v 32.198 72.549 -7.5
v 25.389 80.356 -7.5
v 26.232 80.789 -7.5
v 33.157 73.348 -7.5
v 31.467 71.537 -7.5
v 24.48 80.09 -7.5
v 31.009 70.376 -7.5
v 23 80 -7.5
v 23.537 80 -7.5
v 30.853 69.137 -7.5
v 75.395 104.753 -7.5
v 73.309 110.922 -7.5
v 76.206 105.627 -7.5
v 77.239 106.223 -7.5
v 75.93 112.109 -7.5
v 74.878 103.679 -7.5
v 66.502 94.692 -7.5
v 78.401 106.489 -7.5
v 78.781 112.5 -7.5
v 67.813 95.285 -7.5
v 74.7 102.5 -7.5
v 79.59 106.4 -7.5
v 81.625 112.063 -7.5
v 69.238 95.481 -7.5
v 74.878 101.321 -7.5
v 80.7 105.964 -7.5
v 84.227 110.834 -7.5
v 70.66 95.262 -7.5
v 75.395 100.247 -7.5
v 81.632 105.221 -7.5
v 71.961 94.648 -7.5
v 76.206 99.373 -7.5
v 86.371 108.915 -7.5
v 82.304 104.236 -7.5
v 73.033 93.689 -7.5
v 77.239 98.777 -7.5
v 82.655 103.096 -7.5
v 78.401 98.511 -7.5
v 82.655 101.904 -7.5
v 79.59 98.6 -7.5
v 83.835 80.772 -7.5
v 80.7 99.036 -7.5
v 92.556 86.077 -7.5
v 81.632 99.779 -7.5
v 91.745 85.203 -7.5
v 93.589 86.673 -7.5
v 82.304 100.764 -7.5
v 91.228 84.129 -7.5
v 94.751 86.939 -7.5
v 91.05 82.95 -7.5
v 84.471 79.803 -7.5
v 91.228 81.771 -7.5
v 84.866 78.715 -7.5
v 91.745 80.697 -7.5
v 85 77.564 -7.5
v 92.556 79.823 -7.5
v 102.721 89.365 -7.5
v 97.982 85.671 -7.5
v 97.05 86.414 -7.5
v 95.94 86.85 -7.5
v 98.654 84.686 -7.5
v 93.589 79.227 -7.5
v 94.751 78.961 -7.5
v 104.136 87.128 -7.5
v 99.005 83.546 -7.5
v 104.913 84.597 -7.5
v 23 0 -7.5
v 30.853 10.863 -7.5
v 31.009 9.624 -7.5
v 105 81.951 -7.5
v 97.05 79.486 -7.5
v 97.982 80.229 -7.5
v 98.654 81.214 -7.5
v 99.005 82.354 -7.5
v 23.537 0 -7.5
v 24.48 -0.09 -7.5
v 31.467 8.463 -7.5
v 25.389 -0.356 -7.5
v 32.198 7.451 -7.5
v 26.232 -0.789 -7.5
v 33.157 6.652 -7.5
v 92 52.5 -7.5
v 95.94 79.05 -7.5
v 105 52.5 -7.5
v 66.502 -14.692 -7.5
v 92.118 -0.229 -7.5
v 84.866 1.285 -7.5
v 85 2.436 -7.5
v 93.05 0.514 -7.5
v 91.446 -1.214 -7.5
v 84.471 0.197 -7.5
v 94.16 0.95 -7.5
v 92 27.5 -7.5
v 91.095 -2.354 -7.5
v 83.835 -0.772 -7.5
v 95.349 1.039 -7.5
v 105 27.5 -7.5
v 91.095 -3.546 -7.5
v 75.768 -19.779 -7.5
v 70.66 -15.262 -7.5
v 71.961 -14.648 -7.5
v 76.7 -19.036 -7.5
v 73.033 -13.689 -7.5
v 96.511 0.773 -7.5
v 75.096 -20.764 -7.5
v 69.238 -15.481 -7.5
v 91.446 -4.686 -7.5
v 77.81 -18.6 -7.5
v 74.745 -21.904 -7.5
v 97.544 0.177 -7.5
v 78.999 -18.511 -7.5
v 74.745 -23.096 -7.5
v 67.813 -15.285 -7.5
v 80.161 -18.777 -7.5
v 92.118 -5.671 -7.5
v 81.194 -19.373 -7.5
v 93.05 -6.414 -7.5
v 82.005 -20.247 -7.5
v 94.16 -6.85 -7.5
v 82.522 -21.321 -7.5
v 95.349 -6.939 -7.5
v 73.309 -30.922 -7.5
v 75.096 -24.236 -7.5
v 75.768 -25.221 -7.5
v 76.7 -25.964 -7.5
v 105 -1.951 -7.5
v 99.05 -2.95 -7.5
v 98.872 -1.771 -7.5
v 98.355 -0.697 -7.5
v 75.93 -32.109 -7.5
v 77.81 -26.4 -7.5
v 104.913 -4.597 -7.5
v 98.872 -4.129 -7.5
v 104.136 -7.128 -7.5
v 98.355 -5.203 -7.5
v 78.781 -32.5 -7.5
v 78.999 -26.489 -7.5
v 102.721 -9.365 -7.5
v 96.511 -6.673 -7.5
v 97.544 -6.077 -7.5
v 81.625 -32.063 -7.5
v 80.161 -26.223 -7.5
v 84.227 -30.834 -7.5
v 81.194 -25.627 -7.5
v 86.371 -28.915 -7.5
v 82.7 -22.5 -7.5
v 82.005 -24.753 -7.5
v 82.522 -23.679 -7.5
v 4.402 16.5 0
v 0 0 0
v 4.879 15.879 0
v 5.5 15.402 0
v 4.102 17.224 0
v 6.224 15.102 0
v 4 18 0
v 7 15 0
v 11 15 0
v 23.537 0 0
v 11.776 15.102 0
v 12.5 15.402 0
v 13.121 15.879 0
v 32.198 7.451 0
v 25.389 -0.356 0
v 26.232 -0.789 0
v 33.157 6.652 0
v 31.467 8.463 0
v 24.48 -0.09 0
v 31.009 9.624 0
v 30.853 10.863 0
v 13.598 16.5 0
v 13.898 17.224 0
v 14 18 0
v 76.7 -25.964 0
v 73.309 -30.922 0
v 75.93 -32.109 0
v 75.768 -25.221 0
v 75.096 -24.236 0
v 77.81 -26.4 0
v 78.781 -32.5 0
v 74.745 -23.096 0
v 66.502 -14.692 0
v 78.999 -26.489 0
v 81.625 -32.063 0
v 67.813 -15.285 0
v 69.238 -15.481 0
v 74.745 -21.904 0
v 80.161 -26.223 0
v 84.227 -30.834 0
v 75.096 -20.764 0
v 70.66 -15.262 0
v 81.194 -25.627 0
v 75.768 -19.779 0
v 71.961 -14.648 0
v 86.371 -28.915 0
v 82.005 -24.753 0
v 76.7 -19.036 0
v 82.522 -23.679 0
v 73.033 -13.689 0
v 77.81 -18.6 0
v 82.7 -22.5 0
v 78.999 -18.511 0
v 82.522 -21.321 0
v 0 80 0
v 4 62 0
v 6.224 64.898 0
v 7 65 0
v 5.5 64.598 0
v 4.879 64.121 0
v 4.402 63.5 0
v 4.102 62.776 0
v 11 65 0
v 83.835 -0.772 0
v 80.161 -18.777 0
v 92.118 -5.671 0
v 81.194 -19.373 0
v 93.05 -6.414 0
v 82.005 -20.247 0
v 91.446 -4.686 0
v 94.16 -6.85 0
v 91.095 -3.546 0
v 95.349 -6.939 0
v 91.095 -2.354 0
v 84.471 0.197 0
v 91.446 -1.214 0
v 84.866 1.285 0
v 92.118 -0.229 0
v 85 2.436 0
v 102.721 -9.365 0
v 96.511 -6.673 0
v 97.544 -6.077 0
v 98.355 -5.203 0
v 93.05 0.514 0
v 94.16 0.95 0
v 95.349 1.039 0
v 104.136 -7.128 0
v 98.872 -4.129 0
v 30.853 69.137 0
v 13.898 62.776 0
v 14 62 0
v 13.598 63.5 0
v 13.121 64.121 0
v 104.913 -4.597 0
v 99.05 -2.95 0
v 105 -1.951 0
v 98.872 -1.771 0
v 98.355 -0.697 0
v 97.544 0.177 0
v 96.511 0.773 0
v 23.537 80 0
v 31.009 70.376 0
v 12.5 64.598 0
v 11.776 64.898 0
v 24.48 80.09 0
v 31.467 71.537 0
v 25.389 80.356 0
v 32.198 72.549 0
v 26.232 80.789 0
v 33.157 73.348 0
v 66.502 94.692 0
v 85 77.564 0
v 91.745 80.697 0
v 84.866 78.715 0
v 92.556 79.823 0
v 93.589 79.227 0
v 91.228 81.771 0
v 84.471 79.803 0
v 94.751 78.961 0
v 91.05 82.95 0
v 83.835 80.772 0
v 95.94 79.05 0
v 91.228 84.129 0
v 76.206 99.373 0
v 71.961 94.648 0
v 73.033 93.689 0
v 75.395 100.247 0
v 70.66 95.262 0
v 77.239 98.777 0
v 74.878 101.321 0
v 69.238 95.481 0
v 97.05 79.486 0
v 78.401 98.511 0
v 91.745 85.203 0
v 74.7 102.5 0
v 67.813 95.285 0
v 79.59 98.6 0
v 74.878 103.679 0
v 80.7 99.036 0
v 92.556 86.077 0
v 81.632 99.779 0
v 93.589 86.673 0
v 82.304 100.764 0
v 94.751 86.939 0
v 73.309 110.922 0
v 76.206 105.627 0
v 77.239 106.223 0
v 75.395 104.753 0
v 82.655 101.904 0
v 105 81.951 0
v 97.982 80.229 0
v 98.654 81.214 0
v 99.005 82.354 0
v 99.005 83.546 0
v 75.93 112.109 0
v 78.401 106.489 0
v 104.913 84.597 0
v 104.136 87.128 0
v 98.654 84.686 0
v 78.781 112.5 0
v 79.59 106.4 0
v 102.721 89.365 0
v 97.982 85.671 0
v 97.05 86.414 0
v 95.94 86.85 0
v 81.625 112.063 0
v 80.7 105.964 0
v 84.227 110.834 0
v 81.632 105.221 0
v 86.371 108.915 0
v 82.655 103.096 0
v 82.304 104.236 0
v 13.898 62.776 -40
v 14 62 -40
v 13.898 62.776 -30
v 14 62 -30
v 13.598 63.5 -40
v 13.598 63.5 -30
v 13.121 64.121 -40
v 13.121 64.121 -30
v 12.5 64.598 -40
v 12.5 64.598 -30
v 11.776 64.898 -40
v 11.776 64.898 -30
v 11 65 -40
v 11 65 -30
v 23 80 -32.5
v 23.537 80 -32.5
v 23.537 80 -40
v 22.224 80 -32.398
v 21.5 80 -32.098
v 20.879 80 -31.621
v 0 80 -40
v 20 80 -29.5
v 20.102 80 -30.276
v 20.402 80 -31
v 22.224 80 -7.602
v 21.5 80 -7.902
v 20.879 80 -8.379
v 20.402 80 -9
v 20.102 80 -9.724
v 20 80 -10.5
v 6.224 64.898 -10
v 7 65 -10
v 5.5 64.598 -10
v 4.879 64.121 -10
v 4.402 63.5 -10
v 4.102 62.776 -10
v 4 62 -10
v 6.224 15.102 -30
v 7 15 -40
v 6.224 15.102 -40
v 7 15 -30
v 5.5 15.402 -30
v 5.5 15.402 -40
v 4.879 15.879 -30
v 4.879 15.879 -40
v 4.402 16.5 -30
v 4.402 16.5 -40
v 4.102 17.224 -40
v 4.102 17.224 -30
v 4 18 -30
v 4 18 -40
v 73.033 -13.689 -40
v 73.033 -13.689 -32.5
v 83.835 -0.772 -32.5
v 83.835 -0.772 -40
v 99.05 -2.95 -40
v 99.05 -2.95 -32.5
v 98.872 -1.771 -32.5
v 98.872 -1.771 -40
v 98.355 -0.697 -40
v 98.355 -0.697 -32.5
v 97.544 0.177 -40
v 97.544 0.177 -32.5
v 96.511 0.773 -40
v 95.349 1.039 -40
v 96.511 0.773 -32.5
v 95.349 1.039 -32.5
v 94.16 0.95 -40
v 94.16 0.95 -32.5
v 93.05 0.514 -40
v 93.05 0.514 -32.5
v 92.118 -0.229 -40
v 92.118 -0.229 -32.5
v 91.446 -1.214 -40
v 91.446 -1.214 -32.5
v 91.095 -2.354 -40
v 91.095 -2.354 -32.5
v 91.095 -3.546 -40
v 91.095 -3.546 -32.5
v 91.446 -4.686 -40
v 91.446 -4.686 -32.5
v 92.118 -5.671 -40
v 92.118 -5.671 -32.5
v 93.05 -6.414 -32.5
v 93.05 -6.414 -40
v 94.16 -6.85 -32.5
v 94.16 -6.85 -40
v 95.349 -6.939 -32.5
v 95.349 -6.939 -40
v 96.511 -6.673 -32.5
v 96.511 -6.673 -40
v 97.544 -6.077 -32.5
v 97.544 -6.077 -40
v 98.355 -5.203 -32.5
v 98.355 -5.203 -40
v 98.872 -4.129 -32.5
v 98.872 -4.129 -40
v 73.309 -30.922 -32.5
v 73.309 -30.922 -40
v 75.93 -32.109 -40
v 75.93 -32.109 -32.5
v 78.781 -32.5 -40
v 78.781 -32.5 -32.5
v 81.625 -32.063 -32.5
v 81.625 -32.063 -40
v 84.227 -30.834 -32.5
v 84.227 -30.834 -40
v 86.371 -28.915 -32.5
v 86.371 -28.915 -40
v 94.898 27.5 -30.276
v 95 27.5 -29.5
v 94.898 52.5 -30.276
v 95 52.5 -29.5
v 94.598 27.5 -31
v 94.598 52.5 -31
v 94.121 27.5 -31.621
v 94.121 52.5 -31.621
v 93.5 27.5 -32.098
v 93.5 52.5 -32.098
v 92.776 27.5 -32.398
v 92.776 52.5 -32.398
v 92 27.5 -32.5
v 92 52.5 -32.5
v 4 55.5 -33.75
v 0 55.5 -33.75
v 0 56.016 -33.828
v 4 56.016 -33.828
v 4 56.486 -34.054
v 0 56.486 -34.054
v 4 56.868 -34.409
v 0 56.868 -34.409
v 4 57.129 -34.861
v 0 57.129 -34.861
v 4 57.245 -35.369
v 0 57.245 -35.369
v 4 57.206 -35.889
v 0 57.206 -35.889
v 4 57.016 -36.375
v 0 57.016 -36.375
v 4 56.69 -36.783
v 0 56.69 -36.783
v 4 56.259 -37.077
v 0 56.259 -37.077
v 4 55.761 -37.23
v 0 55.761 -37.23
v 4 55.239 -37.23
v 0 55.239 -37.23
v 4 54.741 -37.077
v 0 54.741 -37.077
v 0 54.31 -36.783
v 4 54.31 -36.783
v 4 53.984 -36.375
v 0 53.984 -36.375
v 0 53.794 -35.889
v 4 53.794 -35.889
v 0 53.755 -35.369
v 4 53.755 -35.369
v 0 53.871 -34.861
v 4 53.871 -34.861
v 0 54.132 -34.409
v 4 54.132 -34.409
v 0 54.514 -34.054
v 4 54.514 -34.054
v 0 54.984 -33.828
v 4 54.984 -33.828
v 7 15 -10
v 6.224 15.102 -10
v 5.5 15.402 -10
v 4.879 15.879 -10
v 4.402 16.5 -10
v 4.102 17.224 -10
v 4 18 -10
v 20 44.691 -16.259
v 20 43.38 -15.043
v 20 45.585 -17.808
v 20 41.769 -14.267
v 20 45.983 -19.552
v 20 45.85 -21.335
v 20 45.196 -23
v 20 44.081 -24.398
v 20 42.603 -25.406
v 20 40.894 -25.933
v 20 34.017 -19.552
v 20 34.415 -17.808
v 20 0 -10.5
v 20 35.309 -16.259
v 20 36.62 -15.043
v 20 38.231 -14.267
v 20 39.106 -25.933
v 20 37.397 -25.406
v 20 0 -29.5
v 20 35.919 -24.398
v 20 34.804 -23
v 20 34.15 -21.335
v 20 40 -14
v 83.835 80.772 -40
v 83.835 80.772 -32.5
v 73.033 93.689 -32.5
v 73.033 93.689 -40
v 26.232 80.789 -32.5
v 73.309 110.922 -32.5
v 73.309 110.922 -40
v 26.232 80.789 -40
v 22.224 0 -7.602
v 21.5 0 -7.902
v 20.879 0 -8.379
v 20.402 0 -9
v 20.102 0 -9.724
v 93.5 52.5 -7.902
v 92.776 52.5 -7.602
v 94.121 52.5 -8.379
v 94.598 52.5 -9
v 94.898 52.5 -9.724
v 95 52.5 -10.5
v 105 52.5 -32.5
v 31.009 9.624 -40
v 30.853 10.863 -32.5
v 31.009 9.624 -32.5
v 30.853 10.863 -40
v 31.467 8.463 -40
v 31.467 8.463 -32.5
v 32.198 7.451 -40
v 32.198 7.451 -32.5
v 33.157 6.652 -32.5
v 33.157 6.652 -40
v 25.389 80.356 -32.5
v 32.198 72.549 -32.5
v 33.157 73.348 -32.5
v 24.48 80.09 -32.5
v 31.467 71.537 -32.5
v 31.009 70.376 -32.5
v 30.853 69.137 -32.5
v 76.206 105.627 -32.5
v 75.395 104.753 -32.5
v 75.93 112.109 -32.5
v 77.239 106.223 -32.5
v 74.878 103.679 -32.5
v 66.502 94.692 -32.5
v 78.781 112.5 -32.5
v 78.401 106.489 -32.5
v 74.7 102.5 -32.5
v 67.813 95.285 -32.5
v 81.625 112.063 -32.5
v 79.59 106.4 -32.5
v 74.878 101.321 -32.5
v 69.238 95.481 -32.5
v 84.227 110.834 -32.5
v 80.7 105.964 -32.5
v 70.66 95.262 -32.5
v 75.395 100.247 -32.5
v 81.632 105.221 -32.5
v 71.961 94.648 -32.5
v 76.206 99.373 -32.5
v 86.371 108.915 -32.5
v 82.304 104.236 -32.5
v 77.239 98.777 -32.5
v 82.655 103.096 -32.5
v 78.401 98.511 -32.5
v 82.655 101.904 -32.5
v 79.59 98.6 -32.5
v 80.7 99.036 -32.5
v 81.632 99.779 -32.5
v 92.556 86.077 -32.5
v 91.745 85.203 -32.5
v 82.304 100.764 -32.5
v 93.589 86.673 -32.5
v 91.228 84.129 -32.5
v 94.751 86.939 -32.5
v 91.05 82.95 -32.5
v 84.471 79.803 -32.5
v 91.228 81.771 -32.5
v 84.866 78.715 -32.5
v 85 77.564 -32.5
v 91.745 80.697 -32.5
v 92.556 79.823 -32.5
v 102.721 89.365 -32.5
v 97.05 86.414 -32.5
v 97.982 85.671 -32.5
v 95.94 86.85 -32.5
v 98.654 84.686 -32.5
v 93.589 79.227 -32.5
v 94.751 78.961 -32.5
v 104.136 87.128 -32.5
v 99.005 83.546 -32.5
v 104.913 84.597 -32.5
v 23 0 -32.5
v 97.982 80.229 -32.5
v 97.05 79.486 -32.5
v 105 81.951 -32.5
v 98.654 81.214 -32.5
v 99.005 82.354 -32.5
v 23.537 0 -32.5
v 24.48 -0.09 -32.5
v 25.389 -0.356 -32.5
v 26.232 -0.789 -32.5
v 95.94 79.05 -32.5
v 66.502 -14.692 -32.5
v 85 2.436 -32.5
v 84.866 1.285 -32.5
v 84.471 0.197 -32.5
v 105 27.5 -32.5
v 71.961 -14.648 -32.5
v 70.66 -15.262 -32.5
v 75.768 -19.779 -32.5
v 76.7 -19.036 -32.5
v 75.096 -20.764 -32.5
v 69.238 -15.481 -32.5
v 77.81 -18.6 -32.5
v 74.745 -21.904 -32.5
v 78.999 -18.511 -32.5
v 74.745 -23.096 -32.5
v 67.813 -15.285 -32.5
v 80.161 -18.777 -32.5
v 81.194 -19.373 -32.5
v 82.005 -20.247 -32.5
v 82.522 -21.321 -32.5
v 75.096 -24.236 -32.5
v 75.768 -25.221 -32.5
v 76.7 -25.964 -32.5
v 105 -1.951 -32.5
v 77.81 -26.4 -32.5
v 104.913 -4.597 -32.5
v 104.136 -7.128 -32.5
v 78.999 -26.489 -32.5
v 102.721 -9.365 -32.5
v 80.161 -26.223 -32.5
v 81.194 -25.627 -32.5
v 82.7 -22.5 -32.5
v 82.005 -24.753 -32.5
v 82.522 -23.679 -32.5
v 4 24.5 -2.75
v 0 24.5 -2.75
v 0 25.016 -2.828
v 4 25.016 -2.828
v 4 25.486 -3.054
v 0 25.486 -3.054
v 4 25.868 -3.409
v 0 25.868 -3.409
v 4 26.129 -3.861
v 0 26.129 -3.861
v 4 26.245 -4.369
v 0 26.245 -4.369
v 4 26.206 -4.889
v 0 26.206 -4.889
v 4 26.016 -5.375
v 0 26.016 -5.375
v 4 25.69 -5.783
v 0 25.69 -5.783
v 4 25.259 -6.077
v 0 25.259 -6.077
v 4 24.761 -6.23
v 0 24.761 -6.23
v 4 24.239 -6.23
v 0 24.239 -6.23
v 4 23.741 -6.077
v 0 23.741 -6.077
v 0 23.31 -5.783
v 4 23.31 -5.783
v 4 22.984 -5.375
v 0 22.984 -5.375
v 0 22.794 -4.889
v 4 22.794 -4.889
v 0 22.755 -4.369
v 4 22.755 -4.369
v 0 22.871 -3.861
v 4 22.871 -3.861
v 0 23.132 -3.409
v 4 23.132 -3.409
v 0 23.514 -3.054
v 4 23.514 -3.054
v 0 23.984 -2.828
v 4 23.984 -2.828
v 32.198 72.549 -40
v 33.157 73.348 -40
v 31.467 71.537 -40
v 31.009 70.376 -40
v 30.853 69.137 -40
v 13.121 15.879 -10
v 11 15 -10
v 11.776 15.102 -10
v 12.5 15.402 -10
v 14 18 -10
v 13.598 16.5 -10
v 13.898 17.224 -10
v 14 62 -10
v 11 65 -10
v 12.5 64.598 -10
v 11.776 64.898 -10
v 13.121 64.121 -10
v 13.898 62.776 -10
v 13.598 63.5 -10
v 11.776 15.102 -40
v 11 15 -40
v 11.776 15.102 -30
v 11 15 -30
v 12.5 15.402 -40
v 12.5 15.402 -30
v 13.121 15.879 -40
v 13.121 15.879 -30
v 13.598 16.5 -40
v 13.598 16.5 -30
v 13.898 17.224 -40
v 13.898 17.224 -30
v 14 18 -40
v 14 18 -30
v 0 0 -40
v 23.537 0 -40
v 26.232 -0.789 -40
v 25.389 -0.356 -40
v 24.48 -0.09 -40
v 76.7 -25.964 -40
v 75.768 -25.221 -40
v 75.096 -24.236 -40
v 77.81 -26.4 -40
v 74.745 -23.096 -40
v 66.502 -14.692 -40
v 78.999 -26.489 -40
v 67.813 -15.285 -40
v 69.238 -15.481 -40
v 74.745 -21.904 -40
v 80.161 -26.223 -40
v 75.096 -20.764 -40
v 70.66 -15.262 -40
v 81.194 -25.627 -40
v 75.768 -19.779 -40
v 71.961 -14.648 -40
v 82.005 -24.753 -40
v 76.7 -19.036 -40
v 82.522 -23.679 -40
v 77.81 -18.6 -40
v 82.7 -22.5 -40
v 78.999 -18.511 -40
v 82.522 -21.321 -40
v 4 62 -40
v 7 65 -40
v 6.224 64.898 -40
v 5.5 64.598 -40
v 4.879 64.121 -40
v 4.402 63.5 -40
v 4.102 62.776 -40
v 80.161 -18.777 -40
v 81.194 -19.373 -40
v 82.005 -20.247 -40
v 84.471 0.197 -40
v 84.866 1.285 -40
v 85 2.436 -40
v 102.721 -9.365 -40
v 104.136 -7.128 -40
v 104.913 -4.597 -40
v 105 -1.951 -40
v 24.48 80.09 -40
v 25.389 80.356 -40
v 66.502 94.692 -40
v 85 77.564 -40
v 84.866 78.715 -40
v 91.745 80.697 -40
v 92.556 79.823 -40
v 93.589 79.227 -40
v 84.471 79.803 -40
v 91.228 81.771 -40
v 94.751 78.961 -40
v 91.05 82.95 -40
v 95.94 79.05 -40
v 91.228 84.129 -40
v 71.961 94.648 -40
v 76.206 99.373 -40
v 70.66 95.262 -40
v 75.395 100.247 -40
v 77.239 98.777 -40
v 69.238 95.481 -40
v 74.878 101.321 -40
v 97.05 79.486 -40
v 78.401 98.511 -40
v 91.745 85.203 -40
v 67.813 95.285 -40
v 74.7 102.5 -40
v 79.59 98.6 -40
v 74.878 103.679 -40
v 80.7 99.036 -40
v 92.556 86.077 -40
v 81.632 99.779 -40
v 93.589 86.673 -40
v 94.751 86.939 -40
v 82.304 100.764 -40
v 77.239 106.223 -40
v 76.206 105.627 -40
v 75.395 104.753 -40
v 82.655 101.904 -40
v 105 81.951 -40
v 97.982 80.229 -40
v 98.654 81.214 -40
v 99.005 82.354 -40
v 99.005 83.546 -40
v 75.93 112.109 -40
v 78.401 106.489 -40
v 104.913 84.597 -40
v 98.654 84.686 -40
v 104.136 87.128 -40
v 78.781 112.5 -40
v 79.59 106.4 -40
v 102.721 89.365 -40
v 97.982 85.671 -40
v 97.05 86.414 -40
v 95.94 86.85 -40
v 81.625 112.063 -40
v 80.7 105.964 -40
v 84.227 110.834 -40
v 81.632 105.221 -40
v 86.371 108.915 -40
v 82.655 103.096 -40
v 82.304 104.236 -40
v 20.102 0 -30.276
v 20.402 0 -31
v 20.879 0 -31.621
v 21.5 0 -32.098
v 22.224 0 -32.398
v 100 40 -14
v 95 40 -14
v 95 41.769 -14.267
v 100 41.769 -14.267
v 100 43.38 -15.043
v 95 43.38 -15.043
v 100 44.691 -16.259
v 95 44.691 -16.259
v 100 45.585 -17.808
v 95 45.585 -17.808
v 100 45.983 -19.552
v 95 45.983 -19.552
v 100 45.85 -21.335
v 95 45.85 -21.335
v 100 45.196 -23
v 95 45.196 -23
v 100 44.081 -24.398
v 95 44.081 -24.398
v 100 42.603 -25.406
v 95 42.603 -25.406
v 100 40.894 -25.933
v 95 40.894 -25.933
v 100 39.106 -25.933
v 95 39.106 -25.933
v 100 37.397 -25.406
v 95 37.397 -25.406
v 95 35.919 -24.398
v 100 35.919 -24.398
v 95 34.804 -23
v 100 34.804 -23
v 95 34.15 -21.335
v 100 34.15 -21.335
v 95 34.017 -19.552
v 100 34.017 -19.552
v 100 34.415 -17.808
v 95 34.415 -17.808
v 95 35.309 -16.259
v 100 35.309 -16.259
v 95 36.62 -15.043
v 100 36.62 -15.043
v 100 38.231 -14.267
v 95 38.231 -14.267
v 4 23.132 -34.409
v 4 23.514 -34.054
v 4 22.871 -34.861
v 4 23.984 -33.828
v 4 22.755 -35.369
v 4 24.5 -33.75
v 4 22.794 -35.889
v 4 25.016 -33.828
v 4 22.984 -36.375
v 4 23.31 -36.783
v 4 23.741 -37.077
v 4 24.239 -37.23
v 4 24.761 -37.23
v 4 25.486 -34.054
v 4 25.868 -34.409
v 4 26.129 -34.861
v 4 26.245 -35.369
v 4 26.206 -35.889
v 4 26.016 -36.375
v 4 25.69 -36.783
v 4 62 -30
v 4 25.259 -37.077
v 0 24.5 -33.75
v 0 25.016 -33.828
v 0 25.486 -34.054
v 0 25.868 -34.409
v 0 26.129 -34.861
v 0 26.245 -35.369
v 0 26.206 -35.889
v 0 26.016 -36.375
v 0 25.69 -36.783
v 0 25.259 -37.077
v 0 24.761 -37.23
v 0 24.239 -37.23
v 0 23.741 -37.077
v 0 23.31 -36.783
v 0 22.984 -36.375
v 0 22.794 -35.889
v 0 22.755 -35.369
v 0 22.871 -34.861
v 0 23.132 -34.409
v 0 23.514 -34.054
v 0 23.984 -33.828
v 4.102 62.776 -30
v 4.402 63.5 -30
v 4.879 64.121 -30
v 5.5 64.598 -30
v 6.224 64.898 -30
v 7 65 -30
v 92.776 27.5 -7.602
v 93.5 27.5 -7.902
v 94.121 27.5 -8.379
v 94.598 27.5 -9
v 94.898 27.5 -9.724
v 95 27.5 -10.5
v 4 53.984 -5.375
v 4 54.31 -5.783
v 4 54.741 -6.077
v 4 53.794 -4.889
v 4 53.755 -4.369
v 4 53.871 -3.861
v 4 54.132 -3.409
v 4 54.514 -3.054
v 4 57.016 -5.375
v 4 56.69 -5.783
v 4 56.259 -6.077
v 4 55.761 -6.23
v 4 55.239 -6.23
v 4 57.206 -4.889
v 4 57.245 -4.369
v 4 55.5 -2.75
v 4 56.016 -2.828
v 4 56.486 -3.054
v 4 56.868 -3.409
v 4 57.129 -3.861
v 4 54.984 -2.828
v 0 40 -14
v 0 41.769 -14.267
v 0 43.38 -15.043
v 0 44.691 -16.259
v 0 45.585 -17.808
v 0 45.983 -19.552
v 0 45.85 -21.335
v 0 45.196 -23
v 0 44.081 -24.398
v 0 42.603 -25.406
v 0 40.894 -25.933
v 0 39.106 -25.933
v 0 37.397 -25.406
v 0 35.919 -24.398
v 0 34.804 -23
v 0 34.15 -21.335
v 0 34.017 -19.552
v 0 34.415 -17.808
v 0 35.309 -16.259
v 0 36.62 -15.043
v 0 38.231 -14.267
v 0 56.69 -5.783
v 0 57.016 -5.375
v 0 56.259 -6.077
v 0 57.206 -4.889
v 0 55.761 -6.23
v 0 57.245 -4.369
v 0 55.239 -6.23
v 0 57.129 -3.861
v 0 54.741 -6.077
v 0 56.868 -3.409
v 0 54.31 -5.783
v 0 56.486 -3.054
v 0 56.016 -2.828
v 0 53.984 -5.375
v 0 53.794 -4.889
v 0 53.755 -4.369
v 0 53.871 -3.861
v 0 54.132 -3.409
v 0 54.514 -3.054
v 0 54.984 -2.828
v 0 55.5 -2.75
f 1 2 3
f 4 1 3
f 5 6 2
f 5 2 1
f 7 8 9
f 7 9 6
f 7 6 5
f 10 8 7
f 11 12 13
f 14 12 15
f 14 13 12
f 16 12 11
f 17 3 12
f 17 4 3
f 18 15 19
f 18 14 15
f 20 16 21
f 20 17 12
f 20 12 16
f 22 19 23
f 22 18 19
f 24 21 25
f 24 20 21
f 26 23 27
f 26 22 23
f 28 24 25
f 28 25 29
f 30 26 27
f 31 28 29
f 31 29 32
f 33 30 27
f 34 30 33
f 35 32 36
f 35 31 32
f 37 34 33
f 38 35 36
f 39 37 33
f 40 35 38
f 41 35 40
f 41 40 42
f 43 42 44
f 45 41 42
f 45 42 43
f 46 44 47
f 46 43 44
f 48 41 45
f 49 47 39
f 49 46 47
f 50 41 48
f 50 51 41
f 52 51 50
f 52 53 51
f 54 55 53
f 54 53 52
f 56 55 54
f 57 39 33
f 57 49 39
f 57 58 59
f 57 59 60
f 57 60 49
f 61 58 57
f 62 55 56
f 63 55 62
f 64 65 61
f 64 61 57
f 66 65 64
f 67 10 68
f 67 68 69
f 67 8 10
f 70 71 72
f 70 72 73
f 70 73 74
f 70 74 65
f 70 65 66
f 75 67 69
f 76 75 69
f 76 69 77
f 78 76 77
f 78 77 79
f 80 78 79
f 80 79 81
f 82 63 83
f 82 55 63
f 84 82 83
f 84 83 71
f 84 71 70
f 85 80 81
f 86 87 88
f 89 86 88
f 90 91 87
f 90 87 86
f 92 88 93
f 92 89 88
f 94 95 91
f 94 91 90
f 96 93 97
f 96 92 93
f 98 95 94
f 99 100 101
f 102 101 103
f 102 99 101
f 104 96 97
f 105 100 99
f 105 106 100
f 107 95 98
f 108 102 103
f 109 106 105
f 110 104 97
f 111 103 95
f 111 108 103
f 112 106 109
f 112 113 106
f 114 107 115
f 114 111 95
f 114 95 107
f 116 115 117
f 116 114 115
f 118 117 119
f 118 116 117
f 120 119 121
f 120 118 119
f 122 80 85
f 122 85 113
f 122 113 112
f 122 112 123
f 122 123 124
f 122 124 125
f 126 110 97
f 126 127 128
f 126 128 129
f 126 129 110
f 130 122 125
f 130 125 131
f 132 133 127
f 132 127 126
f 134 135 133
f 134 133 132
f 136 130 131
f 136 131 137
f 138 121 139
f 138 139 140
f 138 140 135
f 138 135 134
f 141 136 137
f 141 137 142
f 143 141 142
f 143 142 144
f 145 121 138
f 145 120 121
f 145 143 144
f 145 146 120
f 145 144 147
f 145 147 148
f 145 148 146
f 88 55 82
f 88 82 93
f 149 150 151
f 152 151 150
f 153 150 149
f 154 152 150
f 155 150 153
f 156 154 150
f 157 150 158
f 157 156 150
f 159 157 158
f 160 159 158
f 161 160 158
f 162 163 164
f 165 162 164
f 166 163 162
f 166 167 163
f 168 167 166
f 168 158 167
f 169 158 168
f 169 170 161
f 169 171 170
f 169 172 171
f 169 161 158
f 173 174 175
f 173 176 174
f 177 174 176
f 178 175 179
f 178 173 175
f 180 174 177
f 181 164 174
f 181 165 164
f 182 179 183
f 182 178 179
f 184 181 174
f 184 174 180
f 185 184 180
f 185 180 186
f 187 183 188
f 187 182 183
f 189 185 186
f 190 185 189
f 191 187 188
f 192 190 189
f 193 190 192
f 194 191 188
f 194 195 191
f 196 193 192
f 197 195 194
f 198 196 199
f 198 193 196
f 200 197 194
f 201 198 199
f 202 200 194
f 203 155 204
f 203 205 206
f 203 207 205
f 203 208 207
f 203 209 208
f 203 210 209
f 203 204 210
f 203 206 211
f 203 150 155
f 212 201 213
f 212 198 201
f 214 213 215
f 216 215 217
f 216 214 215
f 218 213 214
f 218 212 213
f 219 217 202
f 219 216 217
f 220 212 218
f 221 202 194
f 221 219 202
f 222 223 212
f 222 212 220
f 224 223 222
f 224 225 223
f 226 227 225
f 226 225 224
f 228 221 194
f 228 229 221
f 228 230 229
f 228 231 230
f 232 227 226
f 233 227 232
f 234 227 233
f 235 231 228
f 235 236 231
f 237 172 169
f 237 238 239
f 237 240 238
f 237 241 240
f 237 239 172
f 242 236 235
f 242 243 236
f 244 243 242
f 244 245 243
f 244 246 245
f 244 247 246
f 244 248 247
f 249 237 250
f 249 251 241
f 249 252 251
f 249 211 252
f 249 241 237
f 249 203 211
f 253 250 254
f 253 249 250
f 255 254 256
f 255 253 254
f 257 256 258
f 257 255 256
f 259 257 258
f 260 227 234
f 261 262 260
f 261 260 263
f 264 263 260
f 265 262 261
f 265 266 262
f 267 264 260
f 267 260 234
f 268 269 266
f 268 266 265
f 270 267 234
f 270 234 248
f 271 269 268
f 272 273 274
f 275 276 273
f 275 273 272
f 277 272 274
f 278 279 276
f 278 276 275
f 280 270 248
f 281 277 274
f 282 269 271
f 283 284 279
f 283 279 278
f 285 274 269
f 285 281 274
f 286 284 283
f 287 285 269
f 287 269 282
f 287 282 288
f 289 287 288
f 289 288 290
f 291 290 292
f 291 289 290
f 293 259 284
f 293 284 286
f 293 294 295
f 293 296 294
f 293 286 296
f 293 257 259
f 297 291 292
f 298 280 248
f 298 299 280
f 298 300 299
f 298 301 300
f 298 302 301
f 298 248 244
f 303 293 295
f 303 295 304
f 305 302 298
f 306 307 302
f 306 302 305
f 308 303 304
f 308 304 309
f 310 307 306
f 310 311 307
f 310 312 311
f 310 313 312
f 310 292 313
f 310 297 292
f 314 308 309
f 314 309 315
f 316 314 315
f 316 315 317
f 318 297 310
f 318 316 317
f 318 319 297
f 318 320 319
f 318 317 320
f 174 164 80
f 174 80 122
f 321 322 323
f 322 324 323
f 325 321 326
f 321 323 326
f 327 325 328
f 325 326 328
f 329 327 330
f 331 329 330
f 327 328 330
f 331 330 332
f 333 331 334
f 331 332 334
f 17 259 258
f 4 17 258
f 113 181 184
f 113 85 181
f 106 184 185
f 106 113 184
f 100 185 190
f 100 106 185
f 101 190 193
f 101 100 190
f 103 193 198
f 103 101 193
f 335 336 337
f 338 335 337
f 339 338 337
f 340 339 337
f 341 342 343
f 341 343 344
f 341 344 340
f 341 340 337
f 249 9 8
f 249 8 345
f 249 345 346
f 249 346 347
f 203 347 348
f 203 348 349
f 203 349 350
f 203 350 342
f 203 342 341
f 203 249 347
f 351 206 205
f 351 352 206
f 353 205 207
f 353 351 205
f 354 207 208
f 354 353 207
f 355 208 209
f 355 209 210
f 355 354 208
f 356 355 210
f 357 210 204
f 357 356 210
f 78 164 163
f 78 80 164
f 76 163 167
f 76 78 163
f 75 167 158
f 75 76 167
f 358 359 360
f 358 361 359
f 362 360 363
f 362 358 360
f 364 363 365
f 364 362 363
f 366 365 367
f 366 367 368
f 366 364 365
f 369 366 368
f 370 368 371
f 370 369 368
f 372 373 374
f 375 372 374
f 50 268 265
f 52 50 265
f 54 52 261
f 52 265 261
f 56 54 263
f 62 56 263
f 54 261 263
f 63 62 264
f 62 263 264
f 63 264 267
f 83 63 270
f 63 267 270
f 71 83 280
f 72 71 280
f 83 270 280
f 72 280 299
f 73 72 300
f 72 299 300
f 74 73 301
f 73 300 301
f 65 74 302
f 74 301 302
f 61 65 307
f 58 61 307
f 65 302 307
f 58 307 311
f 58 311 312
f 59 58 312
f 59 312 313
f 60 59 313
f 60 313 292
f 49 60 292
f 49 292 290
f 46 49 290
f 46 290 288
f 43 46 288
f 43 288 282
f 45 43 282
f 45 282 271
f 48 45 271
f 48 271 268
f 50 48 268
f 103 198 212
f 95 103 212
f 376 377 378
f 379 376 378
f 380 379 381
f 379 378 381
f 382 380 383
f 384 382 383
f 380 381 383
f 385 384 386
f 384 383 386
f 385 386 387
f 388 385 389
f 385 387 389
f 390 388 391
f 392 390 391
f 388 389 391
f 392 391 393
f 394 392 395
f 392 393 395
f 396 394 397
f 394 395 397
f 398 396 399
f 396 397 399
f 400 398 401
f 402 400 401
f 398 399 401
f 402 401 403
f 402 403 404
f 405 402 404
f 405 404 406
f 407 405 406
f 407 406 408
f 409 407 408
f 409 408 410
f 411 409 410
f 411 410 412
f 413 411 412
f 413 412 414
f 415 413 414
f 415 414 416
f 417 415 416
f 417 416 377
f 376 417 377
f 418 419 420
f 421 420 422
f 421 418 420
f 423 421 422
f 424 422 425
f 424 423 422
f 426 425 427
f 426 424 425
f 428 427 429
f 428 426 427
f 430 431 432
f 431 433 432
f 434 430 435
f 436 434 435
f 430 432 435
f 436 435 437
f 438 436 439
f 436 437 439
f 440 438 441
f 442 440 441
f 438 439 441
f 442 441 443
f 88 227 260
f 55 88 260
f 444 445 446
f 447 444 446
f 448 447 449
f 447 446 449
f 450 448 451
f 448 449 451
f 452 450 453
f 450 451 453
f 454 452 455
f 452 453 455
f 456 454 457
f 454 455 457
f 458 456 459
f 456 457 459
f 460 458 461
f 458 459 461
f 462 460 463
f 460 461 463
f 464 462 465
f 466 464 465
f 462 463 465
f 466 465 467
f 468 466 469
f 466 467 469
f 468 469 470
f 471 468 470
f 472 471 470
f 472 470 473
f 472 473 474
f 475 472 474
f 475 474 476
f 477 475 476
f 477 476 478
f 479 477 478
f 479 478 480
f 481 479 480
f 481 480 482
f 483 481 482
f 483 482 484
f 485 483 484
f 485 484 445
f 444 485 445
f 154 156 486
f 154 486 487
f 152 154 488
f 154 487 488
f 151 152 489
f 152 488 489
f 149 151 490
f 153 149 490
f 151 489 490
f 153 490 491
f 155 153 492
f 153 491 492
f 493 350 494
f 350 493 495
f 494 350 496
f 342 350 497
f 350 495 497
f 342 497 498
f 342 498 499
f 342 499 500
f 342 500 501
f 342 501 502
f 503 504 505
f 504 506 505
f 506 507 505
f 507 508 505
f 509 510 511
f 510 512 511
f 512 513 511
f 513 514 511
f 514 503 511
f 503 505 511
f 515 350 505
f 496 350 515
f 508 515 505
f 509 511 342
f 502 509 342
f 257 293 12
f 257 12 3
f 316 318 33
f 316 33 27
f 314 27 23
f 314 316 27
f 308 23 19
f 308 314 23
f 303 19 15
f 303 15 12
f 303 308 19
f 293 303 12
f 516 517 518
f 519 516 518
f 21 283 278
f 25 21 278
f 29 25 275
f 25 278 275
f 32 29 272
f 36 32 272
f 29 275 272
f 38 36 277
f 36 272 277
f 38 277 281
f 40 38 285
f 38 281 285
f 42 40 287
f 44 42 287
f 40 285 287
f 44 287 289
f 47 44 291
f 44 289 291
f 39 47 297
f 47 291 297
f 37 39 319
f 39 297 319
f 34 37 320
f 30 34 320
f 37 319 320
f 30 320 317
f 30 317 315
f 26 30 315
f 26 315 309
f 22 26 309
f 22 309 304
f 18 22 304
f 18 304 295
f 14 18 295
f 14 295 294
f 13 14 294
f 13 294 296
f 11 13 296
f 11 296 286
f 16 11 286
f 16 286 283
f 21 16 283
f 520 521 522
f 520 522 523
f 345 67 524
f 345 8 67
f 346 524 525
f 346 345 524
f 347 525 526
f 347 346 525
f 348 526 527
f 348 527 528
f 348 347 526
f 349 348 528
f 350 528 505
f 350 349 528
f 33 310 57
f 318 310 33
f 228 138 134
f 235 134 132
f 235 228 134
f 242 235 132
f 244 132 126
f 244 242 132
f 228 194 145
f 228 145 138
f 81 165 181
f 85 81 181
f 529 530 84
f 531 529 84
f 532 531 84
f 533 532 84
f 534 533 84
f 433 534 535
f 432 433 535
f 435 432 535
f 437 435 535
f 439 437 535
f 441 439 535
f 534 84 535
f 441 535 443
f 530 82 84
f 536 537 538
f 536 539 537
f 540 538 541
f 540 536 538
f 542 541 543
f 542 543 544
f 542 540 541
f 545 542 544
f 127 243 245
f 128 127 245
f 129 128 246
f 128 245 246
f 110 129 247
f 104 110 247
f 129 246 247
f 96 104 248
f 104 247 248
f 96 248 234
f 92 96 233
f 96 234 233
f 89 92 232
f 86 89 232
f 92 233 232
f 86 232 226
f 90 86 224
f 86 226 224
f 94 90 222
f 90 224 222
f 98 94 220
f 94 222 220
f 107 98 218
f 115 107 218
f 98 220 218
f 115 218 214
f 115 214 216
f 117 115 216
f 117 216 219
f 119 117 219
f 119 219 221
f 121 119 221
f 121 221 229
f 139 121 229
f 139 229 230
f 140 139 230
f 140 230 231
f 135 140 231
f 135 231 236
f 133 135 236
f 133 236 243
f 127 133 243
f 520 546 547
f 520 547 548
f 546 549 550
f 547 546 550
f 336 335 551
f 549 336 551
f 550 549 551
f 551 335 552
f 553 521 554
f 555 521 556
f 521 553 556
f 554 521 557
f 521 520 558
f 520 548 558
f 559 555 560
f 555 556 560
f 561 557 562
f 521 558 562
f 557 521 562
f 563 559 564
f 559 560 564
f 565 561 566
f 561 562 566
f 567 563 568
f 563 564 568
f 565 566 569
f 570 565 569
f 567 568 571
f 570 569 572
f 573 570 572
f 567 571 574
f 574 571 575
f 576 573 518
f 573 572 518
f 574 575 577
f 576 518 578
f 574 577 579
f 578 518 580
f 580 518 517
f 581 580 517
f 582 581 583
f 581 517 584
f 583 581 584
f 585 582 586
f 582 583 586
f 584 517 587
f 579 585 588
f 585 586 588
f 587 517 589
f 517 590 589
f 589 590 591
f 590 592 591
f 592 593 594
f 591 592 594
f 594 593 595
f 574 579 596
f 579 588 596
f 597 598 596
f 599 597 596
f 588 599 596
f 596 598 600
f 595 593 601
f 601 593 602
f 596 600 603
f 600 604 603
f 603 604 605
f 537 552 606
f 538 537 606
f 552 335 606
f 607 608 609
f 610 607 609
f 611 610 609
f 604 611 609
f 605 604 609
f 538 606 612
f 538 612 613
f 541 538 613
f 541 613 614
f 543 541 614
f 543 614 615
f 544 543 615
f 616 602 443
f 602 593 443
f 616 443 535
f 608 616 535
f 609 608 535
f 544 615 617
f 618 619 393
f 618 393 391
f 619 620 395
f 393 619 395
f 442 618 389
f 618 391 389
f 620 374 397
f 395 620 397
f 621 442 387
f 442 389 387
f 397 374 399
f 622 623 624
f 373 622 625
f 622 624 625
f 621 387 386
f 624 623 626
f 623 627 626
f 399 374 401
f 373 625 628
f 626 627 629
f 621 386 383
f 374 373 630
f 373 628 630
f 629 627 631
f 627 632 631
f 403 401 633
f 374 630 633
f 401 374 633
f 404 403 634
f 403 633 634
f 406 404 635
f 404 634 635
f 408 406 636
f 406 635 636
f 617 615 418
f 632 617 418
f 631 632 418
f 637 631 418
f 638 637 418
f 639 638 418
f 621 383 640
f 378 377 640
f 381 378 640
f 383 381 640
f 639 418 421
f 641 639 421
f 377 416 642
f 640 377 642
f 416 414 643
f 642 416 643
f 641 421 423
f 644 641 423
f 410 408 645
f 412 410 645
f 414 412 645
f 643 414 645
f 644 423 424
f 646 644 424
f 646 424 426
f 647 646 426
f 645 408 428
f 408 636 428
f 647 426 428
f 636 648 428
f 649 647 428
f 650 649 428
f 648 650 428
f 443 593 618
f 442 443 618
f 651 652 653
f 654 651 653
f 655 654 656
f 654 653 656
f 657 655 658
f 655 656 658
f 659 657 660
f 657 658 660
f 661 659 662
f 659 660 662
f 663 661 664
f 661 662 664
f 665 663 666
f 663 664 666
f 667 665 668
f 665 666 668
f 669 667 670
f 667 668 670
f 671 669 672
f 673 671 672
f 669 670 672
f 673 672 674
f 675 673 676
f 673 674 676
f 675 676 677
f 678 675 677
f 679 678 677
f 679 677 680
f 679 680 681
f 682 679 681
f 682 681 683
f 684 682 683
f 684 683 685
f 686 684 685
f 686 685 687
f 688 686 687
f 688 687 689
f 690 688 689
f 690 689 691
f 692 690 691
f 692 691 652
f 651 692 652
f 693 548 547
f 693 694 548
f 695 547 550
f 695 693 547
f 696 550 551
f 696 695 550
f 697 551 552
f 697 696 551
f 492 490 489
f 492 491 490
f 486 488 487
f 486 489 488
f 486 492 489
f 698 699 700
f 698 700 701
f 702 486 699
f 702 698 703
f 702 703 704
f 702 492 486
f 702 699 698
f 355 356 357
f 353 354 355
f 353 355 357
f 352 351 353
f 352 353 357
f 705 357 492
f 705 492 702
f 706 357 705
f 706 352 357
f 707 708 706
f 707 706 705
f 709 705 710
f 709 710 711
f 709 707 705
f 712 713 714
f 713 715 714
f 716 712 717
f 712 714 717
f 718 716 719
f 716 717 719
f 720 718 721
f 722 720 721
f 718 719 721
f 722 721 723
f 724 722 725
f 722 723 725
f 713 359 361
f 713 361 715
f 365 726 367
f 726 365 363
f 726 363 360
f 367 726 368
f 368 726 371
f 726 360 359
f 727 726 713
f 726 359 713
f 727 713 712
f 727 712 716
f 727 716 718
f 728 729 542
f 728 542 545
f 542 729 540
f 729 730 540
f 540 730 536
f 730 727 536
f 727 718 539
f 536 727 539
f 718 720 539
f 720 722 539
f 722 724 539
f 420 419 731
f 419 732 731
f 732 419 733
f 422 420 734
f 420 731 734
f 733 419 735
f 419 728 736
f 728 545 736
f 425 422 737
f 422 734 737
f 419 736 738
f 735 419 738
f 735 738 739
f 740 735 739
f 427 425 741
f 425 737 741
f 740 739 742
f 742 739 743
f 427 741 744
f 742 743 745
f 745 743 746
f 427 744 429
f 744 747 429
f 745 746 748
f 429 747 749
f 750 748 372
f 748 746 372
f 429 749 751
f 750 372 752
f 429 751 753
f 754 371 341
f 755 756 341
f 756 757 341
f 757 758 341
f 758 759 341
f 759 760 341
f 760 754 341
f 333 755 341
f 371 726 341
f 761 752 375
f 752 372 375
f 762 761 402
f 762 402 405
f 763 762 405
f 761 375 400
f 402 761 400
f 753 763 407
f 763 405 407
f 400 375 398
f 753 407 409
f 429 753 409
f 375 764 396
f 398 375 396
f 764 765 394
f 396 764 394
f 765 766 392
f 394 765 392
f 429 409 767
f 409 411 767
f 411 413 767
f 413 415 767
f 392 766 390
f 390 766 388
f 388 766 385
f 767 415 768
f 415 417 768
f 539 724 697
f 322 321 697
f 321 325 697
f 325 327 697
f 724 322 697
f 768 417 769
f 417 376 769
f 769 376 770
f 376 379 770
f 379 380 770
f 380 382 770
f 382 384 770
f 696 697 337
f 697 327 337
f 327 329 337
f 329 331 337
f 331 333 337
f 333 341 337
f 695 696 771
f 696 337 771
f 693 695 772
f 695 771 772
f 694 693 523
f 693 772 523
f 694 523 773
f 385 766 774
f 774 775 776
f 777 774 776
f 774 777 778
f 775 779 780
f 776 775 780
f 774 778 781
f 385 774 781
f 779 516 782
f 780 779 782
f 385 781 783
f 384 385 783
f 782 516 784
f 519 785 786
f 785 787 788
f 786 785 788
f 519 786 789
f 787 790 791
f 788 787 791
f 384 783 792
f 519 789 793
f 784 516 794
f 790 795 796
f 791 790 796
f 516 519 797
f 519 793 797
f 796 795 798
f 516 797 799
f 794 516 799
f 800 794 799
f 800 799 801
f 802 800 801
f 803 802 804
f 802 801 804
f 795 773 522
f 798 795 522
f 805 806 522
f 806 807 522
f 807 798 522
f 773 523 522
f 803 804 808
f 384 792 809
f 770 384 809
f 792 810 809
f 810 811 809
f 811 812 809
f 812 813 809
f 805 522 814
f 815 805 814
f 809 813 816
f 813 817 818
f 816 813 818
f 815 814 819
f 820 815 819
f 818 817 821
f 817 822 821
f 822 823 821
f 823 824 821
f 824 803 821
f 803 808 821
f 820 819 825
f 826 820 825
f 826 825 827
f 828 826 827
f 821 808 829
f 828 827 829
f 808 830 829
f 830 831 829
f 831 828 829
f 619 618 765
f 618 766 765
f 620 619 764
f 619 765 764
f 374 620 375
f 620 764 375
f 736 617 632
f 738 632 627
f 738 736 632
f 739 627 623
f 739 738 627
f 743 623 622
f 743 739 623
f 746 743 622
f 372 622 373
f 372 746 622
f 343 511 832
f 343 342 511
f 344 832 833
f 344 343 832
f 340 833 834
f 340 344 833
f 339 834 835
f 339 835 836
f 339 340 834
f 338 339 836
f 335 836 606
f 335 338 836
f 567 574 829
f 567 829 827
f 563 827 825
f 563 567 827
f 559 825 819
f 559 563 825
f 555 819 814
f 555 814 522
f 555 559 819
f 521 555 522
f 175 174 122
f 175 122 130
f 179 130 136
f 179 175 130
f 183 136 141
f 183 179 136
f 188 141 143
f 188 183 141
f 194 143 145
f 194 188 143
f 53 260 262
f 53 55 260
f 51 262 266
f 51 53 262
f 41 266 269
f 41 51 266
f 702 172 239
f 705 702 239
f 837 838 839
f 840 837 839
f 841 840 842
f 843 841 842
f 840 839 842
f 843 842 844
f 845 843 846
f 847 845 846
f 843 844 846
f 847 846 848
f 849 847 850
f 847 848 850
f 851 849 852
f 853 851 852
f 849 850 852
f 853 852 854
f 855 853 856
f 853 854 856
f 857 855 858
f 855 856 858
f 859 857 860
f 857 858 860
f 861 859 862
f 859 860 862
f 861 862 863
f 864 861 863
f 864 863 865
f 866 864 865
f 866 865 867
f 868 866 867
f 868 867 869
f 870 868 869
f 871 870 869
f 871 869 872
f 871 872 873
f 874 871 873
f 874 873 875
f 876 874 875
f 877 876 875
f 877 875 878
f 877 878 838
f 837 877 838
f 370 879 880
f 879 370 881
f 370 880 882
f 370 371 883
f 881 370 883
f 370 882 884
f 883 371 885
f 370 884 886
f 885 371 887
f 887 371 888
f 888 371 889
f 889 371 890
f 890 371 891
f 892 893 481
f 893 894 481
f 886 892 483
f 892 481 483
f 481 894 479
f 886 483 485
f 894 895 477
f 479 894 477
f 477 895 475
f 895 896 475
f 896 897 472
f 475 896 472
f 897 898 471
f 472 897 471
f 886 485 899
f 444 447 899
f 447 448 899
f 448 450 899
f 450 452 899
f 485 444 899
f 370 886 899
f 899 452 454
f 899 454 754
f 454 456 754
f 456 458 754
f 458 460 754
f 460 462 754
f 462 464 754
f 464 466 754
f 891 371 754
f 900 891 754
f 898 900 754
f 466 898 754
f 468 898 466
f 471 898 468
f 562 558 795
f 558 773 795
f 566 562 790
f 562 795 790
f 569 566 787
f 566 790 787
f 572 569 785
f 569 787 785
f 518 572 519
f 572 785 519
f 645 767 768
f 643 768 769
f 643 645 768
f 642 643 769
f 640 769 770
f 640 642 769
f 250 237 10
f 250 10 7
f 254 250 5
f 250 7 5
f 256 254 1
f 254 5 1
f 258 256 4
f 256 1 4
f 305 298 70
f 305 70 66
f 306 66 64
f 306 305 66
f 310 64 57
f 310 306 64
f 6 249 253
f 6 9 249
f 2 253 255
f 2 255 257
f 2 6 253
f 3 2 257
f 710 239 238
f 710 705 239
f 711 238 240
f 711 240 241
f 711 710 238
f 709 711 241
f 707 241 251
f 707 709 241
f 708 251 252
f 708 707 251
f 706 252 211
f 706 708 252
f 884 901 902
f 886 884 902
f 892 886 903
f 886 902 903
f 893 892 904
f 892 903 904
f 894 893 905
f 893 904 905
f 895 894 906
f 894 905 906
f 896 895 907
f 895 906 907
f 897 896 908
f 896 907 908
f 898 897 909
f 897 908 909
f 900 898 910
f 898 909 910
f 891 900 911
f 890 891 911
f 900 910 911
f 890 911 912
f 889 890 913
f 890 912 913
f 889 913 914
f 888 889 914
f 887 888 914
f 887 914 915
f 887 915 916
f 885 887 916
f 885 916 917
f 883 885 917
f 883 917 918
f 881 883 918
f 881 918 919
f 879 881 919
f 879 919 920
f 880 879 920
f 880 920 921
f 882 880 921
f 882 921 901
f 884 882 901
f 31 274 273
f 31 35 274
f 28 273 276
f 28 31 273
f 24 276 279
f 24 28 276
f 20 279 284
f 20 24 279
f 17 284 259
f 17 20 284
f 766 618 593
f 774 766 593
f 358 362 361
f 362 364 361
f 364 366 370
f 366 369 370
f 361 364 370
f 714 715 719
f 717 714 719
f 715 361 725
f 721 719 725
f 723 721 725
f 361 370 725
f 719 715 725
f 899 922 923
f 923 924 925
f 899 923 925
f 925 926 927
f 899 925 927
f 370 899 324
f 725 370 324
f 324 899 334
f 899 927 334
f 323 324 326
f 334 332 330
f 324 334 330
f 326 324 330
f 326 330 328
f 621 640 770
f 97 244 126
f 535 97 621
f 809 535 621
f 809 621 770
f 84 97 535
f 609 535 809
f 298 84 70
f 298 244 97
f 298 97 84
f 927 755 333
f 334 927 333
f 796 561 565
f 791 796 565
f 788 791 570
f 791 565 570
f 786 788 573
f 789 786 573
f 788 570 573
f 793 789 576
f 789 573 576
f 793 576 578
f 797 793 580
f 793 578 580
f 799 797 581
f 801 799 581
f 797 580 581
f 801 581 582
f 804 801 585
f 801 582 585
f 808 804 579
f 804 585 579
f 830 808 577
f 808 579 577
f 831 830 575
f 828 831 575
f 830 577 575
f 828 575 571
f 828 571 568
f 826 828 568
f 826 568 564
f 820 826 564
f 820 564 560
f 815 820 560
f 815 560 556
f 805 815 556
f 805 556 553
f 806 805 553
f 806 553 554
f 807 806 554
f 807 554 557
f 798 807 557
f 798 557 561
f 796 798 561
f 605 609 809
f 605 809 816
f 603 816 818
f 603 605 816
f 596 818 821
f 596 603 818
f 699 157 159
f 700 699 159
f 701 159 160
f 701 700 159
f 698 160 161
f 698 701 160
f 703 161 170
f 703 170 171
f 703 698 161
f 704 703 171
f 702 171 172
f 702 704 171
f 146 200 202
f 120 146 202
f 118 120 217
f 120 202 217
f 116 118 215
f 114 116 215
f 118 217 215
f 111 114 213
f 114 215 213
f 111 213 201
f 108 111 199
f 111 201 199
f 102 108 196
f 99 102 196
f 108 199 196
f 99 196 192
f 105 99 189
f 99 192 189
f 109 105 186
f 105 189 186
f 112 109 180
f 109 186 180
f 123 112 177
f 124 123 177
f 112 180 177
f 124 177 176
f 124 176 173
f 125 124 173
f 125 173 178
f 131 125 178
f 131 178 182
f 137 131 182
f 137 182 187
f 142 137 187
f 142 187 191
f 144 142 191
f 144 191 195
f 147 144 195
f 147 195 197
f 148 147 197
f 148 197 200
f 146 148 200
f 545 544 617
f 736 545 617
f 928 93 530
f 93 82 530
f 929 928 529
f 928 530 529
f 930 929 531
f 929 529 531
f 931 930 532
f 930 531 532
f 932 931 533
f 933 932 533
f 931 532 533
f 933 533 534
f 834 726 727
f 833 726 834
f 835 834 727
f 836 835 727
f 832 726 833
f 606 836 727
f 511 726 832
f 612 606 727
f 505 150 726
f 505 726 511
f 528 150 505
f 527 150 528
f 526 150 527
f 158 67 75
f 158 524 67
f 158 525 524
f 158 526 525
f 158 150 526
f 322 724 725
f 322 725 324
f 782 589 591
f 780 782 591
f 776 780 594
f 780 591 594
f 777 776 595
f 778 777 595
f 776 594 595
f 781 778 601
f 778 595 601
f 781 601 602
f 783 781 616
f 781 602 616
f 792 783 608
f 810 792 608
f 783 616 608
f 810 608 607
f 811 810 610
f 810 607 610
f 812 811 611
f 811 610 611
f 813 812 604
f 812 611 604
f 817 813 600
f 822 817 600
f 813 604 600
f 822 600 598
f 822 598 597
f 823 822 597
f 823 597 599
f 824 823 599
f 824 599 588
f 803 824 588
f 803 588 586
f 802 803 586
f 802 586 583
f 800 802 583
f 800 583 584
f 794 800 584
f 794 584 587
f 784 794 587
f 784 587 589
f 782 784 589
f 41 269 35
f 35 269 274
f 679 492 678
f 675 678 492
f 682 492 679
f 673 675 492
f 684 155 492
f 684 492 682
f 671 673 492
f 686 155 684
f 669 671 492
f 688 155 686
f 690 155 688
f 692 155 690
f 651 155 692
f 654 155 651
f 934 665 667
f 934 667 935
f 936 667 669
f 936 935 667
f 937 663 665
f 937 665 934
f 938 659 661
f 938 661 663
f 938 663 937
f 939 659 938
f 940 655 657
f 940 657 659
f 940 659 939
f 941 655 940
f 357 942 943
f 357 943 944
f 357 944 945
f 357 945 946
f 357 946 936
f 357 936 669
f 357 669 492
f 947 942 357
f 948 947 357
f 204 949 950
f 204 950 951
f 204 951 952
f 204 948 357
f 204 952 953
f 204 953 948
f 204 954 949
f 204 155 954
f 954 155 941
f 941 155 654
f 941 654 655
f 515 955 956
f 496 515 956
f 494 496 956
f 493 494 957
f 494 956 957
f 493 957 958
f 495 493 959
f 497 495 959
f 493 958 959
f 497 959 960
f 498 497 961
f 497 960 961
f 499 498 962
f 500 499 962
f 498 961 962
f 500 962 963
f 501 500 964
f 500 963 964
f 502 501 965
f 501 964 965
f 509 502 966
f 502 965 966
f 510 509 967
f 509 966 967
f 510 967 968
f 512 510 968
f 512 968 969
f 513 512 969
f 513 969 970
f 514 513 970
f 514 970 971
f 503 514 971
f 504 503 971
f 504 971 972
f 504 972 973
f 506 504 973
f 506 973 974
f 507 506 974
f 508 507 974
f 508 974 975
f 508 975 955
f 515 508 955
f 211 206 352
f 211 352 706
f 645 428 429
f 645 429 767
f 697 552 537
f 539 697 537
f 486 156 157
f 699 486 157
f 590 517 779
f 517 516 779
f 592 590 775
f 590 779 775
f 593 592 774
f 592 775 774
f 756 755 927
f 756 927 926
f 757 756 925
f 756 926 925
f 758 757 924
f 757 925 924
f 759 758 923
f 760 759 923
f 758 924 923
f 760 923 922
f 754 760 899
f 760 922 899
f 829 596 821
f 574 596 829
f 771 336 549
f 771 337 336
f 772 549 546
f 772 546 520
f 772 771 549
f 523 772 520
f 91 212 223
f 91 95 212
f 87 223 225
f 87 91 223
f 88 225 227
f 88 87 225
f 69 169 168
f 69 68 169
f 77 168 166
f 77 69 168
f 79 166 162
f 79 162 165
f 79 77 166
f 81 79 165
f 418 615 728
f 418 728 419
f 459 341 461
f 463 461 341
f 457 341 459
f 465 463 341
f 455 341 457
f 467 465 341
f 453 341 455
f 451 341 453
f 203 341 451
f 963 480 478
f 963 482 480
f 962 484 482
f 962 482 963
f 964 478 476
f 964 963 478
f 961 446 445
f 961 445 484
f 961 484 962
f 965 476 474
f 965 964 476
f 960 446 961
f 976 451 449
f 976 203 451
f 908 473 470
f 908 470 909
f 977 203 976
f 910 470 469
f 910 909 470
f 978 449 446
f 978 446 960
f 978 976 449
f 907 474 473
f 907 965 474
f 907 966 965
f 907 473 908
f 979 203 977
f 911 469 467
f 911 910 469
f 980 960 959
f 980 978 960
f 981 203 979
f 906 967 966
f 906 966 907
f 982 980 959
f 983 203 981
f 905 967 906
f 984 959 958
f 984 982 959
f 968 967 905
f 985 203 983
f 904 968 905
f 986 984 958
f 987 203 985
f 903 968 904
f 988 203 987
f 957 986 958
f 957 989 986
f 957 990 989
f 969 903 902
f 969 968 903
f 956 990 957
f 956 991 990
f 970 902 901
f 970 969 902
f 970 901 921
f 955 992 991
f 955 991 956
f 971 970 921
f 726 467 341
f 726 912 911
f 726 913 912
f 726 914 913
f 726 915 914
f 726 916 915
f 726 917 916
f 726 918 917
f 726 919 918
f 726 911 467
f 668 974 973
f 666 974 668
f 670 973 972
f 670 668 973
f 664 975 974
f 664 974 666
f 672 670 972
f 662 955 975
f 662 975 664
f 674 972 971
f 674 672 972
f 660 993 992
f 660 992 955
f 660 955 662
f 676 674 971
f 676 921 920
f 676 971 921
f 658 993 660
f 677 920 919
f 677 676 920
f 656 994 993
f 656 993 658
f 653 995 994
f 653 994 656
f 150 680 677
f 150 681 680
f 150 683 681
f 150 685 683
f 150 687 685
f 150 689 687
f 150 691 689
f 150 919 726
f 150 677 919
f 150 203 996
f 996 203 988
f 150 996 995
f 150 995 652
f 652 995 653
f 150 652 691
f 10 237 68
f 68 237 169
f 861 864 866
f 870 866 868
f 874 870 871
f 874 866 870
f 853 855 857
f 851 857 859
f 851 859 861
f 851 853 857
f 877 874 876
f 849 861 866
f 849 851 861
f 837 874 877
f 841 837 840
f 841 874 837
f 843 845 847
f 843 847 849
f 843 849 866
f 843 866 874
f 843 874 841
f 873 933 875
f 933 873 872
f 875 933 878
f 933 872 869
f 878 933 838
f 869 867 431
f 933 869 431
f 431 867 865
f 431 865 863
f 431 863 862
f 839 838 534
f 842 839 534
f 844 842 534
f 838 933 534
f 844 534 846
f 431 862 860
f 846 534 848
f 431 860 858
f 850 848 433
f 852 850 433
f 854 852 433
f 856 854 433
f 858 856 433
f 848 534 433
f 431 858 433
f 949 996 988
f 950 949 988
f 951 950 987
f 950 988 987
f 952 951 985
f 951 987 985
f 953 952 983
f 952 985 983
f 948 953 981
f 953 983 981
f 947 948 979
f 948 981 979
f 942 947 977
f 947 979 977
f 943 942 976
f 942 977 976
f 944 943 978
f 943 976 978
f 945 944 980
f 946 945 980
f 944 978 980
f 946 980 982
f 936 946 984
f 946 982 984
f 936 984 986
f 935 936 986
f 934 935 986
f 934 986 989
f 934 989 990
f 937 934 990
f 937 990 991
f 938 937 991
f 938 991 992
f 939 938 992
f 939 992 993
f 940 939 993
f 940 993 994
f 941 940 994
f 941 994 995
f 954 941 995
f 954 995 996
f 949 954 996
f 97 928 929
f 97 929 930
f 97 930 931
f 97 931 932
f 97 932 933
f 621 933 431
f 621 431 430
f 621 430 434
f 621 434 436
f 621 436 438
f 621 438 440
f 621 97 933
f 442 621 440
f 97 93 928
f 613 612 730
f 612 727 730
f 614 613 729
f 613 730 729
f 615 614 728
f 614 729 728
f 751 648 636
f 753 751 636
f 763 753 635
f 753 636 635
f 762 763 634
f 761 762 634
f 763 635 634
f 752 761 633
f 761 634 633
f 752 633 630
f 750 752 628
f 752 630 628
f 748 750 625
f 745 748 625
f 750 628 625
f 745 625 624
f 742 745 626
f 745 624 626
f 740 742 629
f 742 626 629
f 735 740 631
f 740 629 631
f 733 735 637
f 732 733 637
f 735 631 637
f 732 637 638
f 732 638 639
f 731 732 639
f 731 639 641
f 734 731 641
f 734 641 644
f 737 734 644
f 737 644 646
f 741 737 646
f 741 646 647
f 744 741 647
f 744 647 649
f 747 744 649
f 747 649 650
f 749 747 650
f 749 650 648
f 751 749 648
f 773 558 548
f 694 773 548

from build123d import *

# Parameters (mm, degrees)
SKETCH1_R               = 4
BOSS_EXTRUDE1_DEPTH     = 40
CUT_EXTRUDE1_DEPTH      = 160.033809299
CUT_EXTRUDE1_DEPTH_BACK = 160.033809299
SKETCH2_W               = 100
SKETCH2_H               = 25
SKETCH3_W               = 25
SKETCH3_H               = 25
BOSS_EXTRUDE2_DEPTH     = 10
SKETCH4_R               = 6
CUT_EXTRUDE2_DEPTH      = 100
FILLET1_R               = 5
FILLET2_R               = 3
SKETCH5_R               = 1.75
CUT_EXTRUDE3_DEPTH      = 10
SKETCH7_W               = 10
SKETCH7_H               = 50
CUT_EXTRUDE4_DEPTH      = 10
FILLET3_R               = 3
FILLET3_OF_MIRROR1_R    = 3


with BuildPart() as part:
    # Sketch1 → Boss-Extrude1 (new body)
    with BuildSketch(Plane.XY):
        with BuildLine():
            Line((25, 0), (73.308886978, -30.922345302))
            ThreePointArc((73.308886978, -30.922345302), (80.218691228, -32.384006119), (86.370944241, -28.915342115))
            Line((86.370944241, -28.915342115), (102.720944241, -9.365342115))
            ThreePointArc((102.720944241, -9.365342115), (104.608588105, -5.888263678), (105, -1.951250782))
            Line((105, -1.951250782), (105, 0))
            Line((105, 0), (105, 80))
            Line((105, 80), (105, 81.951250782))
            ThreePointArc((105, 81.951250782), (104.608588105, 85.888263678), (102.720944241, 89.365342115))
            Line((102.720944241, 89.365342115), (86.370944241, 108.915342115))
            ThreePointArc((86.370944241, 108.915342115), (80.218691228, 112.384006119), (73.308886978, 110.922345302))
            Line((73.308886978, 110.922345302), (25, 80))
            Line((25, 80), (0, 80))
            Line((0, 80), (0, 0))
            Line((0, 0), (25, 0))
        make_face()
        with Locations((78.7, -22.5)):
            Circle(SKETCH1_R, mode=Mode.SUBTRACT)
        with Locations((95.05, -2.95)):
            Circle(SKETCH1_R, mode=Mode.SUBTRACT)
        with Locations(Location((78.7, 102.5, 0), (0, 0, 180))):
            Circle(SKETCH1_R, mode=Mode.SUBTRACT)
        with Locations(Location((95.05, 82.95, 0), (0, 0, 180))):
            Circle(SKETCH1_R, mode=Mode.SUBTRACT)
        Polygon((30.852797713, 71.873177413), (30.852797713, 8.126822587), (70.209148437, -17.065036365), (85, 0.620660764), (85, 79.379339236), (70.209148437, 97.065036365), align=None, mode=Mode.SUBTRACT)
    extrude(amount=-BOSS_EXTRUDE1_DEPTH)

    # Sketch2 → Cut-Extrude1 (cut, two sides: drawn at the far end of the back side and taken through both)
    with BuildSketch(Plane(origin=(0, 0, 0), x_dir=(1, 0, 0), z_dir=(0, 1, 0)).offset(-CUT_EXTRUDE1_DEPTH_BACK)):
        with Locations((70, 20)):
            Rectangle(SKETCH2_W, SKETCH2_H)
    extrude(amount=CUT_EXTRUDE1_DEPTH + CUT_EXTRUDE1_DEPTH_BACK, mode=Mode.SUBTRACT)

    # Sketch3 → Boss-Extrude2 (add)
    with BuildSketch(Plane(origin=(105, 0, 0), x_dir=(0, 0, -1), z_dir=(1, 0, 0))):
        with Locations((20, 40)):
            Rectangle(SKETCH3_W, SKETCH3_H)
    extrude(amount=-BOSS_EXTRUDE2_DEPTH)

    # Sketch4 → Cut-Extrude2 (cut)
    with BuildSketch(Plane.ZY):
        with Locations((-20, 40)):
            Circle(SKETCH4_R)
    extrude(amount=-CUT_EXTRUDE2_DEPTH, mode=Mode.SUBTRACT)

    # Fillet1
    fillet1_edges = [part.edges().sort_by_distance(p)[0] for p in [
        (25, 80, -3.75),
        (25, 80, -36.25),
        (25, 0, -36.25),
        (85, 79.379339236, -36.25),
        (85, 0.620660764, -36.25),
        (70.209148437, -17.065036365, -36.25),
        (30.852797713, 8.126822587, -36.25),
        (30.852797713, 71.873177413, -36.25),
        (70.209148437, 97.065036365, -36.25),
        (70.209148437, 97.065036365, -3.75),
        (85, 79.379339236, -3.75),
        (30.852797713, 71.873177413, -3.75),
        (30.852797713, 8.126822587, -3.75),
        (70.209148437, -17.065036365, -3.75),
        (85, 0.620660764, -3.75),
        (25, 0, -3.75),
    ]]
    fillet(fillet1_edges, radius=FILLET1_R)

    # Fillet2
    fillet2_edges = [part.edges().sort_by_distance(p)[0] for p in [
        (20, 40, -32.5),
        (20, 40, -7.5),
        (95, 40, -32.5),
        (95, 40, -7.5),
    ]]
    fillet(fillet2_edges, radius=FILLET2_R)

    # Sketch5 → Cut-Extrude3 (cut)
    with BuildSketch(Plane.ZY):
        with Locations((-35.5, 55.5)):
            Circle(SKETCH5_R)
        with Locations((-4.5, 55.5)):
            Circle(SKETCH5_R)
        with Locations((-35.5, 24.5)):
            Circle(SKETCH5_R)
        with Locations((-4.5, 24.5)):
            Circle(SKETCH5_R)
    extrude(amount=-CUT_EXTRUDE3_DEPTH, mode=Mode.SUBTRACT)

    # Sketch7 → Cut-Extrude4 (cut)
    with BuildSketch(Plane.XY):
        with Locations((9, 40)):
            Rectangle(SKETCH7_W, SKETCH7_H)
    cut_extrude4 = extrude(amount=-CUT_EXTRUDE4_DEPTH, mode=Mode.SUBTRACT)

    # Fillet3
    fillet3_edges = [part.edges().sort_by_distance(p)[0] for p in [
        (4, 15, -5),
        (4, 65, -5),
        (14, 65, -5),
        (14, 15, -5),
    ]]
    fillet(fillet3_edges, radius=FILLET3_R)

    # Mirror1: Cut-Extrude4 across plane
    add(cut_extrude4.mirror(Plane.XY.offset(-20)), mode=Mode.SUBTRACT)

    # Fillet3 of Mirror1
    fillet3_of_mirror1_edges = [part.edges().sort_by_distance(p)[0] for p in [
        (4, 15, -35),
        (4, 65, -35),
        (14, 65, -35),
        (14, 15, -35),
    ]]
    fillet(fillet3_of_mirror1_edges, radius=FILLET3_OF_MIRROR1_R)


solid = part.part
